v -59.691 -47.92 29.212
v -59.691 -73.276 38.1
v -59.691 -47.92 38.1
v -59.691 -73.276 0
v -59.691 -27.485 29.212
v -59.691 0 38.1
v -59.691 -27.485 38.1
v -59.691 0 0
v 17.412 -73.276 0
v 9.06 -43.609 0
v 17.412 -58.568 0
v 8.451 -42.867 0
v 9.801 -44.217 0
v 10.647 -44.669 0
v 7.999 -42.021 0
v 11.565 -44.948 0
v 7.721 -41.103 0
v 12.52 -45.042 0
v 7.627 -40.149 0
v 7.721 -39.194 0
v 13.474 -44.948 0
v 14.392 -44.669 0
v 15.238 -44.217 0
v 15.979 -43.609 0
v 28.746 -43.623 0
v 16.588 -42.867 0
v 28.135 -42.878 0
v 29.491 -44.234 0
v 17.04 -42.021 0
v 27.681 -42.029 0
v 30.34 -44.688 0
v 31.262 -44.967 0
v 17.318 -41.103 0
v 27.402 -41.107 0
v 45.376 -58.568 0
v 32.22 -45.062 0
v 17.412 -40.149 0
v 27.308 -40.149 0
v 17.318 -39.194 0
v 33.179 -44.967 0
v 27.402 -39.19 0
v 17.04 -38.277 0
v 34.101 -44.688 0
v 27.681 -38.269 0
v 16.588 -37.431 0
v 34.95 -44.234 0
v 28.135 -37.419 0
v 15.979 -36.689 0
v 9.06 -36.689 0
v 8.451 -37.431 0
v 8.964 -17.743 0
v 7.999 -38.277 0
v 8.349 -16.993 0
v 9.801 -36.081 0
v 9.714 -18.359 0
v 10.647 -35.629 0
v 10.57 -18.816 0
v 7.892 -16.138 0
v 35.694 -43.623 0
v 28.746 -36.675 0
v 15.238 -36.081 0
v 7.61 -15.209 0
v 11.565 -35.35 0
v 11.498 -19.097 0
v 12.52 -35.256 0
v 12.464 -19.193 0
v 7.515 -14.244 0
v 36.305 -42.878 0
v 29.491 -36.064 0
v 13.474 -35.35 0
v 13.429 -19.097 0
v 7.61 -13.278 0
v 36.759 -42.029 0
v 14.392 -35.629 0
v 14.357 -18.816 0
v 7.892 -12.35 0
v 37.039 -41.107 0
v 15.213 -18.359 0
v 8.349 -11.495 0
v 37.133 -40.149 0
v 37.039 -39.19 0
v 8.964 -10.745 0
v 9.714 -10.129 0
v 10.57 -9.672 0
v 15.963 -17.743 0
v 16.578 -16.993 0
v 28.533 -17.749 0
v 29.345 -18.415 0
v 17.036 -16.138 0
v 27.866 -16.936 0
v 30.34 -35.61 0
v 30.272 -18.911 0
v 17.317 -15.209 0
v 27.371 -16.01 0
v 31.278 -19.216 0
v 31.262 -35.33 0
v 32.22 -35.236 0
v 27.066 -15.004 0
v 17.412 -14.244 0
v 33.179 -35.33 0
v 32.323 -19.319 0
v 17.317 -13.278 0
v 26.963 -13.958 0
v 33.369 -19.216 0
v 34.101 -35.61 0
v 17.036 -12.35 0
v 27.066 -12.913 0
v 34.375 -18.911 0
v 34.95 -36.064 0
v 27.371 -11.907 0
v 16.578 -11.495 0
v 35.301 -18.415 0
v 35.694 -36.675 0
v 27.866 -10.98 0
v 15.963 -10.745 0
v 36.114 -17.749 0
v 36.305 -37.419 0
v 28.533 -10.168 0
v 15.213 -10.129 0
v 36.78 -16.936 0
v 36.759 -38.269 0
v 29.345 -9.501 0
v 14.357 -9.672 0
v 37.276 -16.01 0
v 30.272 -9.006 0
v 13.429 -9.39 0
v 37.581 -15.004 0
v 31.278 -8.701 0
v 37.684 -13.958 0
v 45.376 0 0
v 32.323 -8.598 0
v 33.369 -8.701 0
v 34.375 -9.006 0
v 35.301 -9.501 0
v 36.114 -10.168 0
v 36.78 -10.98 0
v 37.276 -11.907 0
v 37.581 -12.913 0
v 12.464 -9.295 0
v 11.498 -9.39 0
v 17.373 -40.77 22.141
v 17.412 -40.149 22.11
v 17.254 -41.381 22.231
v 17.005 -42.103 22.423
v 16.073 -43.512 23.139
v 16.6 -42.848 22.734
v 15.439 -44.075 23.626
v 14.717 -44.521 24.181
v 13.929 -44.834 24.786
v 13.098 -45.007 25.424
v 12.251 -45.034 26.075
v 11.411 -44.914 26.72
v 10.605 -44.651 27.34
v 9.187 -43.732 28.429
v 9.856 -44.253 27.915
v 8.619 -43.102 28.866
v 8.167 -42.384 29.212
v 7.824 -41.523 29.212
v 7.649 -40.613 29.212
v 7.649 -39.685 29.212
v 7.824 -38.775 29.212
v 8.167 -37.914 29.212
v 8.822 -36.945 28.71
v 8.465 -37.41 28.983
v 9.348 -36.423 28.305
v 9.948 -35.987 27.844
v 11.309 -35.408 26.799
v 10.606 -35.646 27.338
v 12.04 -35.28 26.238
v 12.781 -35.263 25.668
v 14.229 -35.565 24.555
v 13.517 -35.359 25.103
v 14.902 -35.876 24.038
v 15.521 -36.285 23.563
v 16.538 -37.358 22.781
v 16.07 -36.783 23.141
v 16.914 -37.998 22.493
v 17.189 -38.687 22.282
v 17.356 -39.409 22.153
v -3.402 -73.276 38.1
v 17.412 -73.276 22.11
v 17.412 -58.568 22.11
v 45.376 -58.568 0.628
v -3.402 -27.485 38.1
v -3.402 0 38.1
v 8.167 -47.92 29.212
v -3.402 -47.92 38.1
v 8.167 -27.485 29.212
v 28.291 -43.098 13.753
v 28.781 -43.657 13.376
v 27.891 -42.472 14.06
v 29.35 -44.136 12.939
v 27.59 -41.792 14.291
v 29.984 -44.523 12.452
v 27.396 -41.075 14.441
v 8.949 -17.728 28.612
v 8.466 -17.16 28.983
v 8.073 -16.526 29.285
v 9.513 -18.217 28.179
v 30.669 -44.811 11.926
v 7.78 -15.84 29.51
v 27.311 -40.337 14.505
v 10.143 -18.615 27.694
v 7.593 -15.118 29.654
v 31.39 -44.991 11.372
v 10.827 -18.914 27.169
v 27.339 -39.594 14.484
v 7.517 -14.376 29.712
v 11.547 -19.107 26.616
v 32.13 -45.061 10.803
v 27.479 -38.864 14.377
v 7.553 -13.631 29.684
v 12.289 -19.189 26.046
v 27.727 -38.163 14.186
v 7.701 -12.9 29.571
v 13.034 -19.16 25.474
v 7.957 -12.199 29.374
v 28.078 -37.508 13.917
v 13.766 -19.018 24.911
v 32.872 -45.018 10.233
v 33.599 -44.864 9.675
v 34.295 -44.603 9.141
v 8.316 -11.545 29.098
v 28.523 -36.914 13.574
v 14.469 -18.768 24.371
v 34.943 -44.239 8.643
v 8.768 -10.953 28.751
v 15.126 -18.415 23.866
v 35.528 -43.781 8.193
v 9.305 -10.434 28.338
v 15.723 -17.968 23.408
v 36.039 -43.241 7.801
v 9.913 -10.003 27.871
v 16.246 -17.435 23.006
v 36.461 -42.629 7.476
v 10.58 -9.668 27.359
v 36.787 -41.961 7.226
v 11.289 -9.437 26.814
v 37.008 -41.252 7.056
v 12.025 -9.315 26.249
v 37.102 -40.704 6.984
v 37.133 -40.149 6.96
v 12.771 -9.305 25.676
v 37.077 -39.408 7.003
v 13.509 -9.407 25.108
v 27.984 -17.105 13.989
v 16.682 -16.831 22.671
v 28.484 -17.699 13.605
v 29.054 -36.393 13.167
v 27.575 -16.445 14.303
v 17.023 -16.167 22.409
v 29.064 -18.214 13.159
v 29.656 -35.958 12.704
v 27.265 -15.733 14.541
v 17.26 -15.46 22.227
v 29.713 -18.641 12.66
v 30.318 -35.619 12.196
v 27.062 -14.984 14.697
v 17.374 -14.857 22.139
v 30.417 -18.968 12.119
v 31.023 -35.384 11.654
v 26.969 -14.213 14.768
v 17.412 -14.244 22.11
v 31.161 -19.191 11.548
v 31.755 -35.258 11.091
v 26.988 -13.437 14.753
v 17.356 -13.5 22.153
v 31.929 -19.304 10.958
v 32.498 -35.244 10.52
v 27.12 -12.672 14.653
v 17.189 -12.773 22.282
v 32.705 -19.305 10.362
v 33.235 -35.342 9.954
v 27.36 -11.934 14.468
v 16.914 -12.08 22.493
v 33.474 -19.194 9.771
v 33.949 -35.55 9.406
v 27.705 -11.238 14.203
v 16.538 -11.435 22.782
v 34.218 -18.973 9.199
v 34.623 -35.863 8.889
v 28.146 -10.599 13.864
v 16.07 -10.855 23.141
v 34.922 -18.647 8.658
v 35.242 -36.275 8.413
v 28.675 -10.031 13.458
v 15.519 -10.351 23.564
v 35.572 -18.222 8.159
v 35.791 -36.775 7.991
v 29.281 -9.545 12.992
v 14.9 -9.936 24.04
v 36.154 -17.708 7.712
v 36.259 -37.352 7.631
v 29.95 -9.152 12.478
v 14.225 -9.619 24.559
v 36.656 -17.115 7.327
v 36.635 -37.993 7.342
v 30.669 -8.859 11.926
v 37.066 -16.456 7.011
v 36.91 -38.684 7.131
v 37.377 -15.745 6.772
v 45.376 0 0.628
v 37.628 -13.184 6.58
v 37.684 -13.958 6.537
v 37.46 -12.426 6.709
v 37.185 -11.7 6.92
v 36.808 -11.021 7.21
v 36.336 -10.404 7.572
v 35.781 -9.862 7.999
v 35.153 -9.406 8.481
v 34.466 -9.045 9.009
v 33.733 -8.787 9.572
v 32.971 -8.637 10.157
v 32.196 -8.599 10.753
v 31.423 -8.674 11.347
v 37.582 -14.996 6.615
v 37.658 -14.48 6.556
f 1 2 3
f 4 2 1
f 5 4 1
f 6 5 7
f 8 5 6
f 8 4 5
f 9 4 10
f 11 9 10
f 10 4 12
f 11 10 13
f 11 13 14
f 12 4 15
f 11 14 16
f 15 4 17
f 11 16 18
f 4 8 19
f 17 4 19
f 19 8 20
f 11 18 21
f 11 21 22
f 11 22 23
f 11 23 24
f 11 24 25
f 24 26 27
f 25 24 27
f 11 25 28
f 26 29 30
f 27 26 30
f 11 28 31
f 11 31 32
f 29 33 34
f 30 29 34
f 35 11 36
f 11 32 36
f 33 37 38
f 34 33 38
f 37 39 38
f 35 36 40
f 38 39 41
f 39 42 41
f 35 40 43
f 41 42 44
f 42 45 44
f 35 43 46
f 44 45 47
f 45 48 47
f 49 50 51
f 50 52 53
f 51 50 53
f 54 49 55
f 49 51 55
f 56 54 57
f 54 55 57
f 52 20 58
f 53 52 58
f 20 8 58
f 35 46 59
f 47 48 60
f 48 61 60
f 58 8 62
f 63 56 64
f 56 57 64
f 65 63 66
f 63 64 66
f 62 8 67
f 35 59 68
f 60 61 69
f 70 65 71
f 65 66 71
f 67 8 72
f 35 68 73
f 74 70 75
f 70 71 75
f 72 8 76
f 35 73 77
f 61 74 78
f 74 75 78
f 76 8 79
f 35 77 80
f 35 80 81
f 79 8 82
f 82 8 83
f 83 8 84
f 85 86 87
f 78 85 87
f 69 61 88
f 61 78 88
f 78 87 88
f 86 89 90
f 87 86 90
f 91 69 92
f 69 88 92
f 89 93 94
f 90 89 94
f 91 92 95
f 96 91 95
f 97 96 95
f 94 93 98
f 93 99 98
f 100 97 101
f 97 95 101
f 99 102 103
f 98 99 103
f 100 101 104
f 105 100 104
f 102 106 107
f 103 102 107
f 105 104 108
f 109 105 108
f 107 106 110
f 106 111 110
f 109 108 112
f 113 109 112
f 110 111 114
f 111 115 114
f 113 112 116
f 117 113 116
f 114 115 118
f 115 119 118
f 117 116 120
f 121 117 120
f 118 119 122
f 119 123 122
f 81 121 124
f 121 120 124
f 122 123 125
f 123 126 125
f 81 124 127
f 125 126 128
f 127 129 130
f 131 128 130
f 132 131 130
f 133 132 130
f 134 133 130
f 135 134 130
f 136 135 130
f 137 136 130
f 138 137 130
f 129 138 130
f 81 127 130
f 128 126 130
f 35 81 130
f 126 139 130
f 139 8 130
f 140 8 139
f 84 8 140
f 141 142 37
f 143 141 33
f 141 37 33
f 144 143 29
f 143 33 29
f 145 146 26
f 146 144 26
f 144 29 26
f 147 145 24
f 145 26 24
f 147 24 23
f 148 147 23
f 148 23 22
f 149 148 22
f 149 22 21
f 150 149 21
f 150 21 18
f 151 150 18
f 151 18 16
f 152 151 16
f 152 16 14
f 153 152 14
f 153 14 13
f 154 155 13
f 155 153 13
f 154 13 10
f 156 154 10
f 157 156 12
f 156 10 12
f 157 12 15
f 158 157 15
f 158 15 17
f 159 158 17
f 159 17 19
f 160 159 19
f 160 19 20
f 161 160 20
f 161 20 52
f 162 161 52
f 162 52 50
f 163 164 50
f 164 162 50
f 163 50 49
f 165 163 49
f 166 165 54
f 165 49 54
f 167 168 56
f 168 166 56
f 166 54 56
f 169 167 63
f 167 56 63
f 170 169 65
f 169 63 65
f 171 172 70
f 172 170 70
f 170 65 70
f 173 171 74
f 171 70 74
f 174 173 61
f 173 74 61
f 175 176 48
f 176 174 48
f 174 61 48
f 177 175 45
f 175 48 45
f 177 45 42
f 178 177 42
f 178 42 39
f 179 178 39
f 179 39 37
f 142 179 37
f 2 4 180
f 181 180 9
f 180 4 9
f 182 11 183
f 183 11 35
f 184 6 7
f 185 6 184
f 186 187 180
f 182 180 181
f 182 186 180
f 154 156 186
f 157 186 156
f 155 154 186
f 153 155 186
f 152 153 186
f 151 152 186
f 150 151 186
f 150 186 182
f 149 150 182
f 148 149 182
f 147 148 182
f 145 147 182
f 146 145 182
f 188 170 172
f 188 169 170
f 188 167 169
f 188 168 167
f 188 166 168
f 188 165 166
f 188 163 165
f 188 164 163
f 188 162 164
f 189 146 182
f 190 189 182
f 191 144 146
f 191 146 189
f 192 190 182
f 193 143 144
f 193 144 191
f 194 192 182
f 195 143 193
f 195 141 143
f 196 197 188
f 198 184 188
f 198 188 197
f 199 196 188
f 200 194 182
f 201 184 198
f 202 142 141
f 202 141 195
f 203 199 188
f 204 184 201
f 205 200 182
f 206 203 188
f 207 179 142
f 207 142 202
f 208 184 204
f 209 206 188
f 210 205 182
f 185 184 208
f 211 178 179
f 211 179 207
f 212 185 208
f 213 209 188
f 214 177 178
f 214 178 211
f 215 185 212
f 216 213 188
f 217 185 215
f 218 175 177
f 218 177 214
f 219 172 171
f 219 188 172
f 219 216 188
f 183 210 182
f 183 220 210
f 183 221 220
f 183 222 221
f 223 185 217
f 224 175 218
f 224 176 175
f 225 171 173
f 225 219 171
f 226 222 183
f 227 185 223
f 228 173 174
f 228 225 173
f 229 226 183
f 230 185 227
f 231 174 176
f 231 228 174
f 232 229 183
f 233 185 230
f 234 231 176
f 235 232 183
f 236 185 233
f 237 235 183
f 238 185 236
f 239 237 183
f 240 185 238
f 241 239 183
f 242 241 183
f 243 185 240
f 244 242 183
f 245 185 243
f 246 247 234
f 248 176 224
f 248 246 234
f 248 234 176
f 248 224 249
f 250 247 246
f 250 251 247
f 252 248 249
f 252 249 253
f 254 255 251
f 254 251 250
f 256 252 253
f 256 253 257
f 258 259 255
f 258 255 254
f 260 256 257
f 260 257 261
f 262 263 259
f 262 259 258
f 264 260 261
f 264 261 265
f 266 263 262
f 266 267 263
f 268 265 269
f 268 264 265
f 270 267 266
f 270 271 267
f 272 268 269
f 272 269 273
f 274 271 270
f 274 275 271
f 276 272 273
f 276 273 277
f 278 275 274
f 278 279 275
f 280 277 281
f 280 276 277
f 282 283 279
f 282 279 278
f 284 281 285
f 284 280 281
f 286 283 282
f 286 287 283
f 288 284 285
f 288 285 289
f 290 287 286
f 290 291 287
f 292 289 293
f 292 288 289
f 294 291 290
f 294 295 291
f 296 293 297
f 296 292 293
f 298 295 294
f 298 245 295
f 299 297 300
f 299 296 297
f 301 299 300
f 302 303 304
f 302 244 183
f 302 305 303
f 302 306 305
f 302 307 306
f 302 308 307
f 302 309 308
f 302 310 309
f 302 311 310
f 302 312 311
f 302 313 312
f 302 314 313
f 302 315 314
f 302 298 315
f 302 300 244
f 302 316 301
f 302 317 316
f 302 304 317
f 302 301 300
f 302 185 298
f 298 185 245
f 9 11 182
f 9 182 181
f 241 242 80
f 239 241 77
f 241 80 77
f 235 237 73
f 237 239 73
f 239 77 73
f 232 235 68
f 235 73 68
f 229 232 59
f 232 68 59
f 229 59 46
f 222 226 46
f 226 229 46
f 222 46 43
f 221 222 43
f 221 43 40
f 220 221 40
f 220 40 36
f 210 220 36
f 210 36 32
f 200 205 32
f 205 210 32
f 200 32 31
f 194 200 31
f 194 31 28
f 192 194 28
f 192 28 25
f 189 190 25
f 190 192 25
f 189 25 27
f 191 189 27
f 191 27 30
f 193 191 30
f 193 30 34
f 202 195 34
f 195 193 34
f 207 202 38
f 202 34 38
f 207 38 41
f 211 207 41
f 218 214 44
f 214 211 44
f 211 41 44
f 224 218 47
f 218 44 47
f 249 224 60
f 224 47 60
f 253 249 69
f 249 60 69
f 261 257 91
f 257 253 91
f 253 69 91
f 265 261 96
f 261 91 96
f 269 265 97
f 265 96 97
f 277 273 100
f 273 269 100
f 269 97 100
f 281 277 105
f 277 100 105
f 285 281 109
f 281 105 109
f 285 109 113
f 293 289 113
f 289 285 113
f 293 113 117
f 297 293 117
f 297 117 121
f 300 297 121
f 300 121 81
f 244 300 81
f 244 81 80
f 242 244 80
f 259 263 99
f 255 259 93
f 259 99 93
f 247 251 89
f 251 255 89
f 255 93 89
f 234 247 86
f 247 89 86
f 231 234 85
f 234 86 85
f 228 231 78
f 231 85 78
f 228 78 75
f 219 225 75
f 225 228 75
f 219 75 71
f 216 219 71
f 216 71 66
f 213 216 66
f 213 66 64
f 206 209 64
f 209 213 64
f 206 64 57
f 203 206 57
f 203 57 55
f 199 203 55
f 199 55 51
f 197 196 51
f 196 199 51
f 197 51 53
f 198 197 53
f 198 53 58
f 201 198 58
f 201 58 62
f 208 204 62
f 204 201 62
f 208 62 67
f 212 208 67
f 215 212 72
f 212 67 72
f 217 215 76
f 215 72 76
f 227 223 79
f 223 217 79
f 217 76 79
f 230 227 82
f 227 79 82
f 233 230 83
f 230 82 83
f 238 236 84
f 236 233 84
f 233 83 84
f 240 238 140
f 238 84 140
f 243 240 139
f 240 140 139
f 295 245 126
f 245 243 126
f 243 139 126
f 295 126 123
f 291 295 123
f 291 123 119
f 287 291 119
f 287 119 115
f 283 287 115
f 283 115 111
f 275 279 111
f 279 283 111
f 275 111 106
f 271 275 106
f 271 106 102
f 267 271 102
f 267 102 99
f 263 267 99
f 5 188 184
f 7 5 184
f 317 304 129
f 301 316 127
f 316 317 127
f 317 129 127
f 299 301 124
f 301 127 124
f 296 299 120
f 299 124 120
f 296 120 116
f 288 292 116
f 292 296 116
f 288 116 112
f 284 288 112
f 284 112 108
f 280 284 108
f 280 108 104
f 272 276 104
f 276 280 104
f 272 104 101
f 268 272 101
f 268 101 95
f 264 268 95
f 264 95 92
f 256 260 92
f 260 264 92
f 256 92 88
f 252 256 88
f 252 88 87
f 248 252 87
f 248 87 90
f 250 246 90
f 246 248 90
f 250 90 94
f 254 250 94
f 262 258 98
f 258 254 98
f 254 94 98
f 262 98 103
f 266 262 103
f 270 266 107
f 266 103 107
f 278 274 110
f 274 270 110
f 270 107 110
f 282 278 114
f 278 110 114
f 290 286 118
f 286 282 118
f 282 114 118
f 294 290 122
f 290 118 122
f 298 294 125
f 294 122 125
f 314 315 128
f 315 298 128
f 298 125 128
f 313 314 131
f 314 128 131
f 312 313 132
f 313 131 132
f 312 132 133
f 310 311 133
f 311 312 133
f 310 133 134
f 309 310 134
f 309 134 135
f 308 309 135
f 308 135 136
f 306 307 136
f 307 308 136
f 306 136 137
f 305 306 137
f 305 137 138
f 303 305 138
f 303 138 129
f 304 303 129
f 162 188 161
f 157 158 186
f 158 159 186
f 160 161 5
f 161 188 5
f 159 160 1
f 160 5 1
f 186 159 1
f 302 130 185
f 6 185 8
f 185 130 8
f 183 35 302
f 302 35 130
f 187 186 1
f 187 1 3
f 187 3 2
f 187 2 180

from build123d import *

# Parameters (mm, degrees)
F0_W     = 59.6908442676
F0_H     = 73.2762925327
F0_W_2   = 45.3756786883
F1_DEPTH = 38.1
F3_DEPTH = 76.2
F4_W     = 20.4342082143
F4_H     = 8.8877151668
F5_DEPTH = 76.2
F6_W     = 27.9634296894
F6_H     = 14.7078186274
F7_DEPTH = 25.4
F8_R     = 4.8926994205
F8_R_2   = 4.9486448894
F8_R_3   = 4.9129402175
F8_R_4   = 5.3604581345
F9_DEPTH = 76.2


with BuildPart() as f1:
    # F0 (on Top) → F1 (new body)
    with BuildSketch(Plane.XY):
        with Locations((-29.8454221338, -36.6381462663)):
            Rectangle(F0_W, F0_H)
        with Locations((22.6878393441, -36.6381462663)):
            Rectangle(F0_W_2, F0_H)
    extrude(amount=F1_DEPTH)

    # F2 (on Front) → F3 (cut)
    with BuildSketch(Plane.XZ):
        Polygon((-9.0658813715, 42.4513481557), (46.1928248405, 0), (48.2074655592, 0), (48.2074655592, 42.4513481557), align=None)
    extrude(amount=F3_DEPTH, mode=Mode.SUBTRACT)

    # F4 (on face) → F5 (cut)
    with BuildSketch(Plane(origin=(-59.6908442676, 0, 0), x_dir=(0, -1, 0), z_dir=(-1, 0, 0))):
        with Locations((37.7025529742, 33.6561424166)):
            Rectangle(F4_W, F4_H)
    extrude(amount=-F5_DEPTH, mode=Mode.SUBTRACT)

    # F6 (on face) → F7 (cut)
    with BuildSketch(Plane(origin=(0, 0, 0), x_dir=(1, 0, 0), z_dir=(0, 0, -1))):
        with Locations((31.3939638436, 65.922383219)):
            Rectangle(F6_W, F6_H)
    extrude(amount=-F7_DEPTH, mode=Mode.SUBTRACT)

    # F8 (on face) → F9 (cut)
    with BuildSketch(Plane(origin=(0, 0, 0), x_dir=(1, 0, 0), z_dir=(0, 0, -1))):
        with Locations((12.5195495784, 40.1489026845)):
            Circle(F8_R)
        with Locations((12.4636041095, 14.2439040613)):
            Circle(F8_R_2)
        with Locations((32.2204525995, 40.1489026845)):
            Circle(F8_R_3)
        with Locations((32.3233206043, 13.9583635985)):
            Circle(F8_R_4)
    extrude(amount=-F9_DEPTH, mode=Mode.SUBTRACT)


solid = f1.part
